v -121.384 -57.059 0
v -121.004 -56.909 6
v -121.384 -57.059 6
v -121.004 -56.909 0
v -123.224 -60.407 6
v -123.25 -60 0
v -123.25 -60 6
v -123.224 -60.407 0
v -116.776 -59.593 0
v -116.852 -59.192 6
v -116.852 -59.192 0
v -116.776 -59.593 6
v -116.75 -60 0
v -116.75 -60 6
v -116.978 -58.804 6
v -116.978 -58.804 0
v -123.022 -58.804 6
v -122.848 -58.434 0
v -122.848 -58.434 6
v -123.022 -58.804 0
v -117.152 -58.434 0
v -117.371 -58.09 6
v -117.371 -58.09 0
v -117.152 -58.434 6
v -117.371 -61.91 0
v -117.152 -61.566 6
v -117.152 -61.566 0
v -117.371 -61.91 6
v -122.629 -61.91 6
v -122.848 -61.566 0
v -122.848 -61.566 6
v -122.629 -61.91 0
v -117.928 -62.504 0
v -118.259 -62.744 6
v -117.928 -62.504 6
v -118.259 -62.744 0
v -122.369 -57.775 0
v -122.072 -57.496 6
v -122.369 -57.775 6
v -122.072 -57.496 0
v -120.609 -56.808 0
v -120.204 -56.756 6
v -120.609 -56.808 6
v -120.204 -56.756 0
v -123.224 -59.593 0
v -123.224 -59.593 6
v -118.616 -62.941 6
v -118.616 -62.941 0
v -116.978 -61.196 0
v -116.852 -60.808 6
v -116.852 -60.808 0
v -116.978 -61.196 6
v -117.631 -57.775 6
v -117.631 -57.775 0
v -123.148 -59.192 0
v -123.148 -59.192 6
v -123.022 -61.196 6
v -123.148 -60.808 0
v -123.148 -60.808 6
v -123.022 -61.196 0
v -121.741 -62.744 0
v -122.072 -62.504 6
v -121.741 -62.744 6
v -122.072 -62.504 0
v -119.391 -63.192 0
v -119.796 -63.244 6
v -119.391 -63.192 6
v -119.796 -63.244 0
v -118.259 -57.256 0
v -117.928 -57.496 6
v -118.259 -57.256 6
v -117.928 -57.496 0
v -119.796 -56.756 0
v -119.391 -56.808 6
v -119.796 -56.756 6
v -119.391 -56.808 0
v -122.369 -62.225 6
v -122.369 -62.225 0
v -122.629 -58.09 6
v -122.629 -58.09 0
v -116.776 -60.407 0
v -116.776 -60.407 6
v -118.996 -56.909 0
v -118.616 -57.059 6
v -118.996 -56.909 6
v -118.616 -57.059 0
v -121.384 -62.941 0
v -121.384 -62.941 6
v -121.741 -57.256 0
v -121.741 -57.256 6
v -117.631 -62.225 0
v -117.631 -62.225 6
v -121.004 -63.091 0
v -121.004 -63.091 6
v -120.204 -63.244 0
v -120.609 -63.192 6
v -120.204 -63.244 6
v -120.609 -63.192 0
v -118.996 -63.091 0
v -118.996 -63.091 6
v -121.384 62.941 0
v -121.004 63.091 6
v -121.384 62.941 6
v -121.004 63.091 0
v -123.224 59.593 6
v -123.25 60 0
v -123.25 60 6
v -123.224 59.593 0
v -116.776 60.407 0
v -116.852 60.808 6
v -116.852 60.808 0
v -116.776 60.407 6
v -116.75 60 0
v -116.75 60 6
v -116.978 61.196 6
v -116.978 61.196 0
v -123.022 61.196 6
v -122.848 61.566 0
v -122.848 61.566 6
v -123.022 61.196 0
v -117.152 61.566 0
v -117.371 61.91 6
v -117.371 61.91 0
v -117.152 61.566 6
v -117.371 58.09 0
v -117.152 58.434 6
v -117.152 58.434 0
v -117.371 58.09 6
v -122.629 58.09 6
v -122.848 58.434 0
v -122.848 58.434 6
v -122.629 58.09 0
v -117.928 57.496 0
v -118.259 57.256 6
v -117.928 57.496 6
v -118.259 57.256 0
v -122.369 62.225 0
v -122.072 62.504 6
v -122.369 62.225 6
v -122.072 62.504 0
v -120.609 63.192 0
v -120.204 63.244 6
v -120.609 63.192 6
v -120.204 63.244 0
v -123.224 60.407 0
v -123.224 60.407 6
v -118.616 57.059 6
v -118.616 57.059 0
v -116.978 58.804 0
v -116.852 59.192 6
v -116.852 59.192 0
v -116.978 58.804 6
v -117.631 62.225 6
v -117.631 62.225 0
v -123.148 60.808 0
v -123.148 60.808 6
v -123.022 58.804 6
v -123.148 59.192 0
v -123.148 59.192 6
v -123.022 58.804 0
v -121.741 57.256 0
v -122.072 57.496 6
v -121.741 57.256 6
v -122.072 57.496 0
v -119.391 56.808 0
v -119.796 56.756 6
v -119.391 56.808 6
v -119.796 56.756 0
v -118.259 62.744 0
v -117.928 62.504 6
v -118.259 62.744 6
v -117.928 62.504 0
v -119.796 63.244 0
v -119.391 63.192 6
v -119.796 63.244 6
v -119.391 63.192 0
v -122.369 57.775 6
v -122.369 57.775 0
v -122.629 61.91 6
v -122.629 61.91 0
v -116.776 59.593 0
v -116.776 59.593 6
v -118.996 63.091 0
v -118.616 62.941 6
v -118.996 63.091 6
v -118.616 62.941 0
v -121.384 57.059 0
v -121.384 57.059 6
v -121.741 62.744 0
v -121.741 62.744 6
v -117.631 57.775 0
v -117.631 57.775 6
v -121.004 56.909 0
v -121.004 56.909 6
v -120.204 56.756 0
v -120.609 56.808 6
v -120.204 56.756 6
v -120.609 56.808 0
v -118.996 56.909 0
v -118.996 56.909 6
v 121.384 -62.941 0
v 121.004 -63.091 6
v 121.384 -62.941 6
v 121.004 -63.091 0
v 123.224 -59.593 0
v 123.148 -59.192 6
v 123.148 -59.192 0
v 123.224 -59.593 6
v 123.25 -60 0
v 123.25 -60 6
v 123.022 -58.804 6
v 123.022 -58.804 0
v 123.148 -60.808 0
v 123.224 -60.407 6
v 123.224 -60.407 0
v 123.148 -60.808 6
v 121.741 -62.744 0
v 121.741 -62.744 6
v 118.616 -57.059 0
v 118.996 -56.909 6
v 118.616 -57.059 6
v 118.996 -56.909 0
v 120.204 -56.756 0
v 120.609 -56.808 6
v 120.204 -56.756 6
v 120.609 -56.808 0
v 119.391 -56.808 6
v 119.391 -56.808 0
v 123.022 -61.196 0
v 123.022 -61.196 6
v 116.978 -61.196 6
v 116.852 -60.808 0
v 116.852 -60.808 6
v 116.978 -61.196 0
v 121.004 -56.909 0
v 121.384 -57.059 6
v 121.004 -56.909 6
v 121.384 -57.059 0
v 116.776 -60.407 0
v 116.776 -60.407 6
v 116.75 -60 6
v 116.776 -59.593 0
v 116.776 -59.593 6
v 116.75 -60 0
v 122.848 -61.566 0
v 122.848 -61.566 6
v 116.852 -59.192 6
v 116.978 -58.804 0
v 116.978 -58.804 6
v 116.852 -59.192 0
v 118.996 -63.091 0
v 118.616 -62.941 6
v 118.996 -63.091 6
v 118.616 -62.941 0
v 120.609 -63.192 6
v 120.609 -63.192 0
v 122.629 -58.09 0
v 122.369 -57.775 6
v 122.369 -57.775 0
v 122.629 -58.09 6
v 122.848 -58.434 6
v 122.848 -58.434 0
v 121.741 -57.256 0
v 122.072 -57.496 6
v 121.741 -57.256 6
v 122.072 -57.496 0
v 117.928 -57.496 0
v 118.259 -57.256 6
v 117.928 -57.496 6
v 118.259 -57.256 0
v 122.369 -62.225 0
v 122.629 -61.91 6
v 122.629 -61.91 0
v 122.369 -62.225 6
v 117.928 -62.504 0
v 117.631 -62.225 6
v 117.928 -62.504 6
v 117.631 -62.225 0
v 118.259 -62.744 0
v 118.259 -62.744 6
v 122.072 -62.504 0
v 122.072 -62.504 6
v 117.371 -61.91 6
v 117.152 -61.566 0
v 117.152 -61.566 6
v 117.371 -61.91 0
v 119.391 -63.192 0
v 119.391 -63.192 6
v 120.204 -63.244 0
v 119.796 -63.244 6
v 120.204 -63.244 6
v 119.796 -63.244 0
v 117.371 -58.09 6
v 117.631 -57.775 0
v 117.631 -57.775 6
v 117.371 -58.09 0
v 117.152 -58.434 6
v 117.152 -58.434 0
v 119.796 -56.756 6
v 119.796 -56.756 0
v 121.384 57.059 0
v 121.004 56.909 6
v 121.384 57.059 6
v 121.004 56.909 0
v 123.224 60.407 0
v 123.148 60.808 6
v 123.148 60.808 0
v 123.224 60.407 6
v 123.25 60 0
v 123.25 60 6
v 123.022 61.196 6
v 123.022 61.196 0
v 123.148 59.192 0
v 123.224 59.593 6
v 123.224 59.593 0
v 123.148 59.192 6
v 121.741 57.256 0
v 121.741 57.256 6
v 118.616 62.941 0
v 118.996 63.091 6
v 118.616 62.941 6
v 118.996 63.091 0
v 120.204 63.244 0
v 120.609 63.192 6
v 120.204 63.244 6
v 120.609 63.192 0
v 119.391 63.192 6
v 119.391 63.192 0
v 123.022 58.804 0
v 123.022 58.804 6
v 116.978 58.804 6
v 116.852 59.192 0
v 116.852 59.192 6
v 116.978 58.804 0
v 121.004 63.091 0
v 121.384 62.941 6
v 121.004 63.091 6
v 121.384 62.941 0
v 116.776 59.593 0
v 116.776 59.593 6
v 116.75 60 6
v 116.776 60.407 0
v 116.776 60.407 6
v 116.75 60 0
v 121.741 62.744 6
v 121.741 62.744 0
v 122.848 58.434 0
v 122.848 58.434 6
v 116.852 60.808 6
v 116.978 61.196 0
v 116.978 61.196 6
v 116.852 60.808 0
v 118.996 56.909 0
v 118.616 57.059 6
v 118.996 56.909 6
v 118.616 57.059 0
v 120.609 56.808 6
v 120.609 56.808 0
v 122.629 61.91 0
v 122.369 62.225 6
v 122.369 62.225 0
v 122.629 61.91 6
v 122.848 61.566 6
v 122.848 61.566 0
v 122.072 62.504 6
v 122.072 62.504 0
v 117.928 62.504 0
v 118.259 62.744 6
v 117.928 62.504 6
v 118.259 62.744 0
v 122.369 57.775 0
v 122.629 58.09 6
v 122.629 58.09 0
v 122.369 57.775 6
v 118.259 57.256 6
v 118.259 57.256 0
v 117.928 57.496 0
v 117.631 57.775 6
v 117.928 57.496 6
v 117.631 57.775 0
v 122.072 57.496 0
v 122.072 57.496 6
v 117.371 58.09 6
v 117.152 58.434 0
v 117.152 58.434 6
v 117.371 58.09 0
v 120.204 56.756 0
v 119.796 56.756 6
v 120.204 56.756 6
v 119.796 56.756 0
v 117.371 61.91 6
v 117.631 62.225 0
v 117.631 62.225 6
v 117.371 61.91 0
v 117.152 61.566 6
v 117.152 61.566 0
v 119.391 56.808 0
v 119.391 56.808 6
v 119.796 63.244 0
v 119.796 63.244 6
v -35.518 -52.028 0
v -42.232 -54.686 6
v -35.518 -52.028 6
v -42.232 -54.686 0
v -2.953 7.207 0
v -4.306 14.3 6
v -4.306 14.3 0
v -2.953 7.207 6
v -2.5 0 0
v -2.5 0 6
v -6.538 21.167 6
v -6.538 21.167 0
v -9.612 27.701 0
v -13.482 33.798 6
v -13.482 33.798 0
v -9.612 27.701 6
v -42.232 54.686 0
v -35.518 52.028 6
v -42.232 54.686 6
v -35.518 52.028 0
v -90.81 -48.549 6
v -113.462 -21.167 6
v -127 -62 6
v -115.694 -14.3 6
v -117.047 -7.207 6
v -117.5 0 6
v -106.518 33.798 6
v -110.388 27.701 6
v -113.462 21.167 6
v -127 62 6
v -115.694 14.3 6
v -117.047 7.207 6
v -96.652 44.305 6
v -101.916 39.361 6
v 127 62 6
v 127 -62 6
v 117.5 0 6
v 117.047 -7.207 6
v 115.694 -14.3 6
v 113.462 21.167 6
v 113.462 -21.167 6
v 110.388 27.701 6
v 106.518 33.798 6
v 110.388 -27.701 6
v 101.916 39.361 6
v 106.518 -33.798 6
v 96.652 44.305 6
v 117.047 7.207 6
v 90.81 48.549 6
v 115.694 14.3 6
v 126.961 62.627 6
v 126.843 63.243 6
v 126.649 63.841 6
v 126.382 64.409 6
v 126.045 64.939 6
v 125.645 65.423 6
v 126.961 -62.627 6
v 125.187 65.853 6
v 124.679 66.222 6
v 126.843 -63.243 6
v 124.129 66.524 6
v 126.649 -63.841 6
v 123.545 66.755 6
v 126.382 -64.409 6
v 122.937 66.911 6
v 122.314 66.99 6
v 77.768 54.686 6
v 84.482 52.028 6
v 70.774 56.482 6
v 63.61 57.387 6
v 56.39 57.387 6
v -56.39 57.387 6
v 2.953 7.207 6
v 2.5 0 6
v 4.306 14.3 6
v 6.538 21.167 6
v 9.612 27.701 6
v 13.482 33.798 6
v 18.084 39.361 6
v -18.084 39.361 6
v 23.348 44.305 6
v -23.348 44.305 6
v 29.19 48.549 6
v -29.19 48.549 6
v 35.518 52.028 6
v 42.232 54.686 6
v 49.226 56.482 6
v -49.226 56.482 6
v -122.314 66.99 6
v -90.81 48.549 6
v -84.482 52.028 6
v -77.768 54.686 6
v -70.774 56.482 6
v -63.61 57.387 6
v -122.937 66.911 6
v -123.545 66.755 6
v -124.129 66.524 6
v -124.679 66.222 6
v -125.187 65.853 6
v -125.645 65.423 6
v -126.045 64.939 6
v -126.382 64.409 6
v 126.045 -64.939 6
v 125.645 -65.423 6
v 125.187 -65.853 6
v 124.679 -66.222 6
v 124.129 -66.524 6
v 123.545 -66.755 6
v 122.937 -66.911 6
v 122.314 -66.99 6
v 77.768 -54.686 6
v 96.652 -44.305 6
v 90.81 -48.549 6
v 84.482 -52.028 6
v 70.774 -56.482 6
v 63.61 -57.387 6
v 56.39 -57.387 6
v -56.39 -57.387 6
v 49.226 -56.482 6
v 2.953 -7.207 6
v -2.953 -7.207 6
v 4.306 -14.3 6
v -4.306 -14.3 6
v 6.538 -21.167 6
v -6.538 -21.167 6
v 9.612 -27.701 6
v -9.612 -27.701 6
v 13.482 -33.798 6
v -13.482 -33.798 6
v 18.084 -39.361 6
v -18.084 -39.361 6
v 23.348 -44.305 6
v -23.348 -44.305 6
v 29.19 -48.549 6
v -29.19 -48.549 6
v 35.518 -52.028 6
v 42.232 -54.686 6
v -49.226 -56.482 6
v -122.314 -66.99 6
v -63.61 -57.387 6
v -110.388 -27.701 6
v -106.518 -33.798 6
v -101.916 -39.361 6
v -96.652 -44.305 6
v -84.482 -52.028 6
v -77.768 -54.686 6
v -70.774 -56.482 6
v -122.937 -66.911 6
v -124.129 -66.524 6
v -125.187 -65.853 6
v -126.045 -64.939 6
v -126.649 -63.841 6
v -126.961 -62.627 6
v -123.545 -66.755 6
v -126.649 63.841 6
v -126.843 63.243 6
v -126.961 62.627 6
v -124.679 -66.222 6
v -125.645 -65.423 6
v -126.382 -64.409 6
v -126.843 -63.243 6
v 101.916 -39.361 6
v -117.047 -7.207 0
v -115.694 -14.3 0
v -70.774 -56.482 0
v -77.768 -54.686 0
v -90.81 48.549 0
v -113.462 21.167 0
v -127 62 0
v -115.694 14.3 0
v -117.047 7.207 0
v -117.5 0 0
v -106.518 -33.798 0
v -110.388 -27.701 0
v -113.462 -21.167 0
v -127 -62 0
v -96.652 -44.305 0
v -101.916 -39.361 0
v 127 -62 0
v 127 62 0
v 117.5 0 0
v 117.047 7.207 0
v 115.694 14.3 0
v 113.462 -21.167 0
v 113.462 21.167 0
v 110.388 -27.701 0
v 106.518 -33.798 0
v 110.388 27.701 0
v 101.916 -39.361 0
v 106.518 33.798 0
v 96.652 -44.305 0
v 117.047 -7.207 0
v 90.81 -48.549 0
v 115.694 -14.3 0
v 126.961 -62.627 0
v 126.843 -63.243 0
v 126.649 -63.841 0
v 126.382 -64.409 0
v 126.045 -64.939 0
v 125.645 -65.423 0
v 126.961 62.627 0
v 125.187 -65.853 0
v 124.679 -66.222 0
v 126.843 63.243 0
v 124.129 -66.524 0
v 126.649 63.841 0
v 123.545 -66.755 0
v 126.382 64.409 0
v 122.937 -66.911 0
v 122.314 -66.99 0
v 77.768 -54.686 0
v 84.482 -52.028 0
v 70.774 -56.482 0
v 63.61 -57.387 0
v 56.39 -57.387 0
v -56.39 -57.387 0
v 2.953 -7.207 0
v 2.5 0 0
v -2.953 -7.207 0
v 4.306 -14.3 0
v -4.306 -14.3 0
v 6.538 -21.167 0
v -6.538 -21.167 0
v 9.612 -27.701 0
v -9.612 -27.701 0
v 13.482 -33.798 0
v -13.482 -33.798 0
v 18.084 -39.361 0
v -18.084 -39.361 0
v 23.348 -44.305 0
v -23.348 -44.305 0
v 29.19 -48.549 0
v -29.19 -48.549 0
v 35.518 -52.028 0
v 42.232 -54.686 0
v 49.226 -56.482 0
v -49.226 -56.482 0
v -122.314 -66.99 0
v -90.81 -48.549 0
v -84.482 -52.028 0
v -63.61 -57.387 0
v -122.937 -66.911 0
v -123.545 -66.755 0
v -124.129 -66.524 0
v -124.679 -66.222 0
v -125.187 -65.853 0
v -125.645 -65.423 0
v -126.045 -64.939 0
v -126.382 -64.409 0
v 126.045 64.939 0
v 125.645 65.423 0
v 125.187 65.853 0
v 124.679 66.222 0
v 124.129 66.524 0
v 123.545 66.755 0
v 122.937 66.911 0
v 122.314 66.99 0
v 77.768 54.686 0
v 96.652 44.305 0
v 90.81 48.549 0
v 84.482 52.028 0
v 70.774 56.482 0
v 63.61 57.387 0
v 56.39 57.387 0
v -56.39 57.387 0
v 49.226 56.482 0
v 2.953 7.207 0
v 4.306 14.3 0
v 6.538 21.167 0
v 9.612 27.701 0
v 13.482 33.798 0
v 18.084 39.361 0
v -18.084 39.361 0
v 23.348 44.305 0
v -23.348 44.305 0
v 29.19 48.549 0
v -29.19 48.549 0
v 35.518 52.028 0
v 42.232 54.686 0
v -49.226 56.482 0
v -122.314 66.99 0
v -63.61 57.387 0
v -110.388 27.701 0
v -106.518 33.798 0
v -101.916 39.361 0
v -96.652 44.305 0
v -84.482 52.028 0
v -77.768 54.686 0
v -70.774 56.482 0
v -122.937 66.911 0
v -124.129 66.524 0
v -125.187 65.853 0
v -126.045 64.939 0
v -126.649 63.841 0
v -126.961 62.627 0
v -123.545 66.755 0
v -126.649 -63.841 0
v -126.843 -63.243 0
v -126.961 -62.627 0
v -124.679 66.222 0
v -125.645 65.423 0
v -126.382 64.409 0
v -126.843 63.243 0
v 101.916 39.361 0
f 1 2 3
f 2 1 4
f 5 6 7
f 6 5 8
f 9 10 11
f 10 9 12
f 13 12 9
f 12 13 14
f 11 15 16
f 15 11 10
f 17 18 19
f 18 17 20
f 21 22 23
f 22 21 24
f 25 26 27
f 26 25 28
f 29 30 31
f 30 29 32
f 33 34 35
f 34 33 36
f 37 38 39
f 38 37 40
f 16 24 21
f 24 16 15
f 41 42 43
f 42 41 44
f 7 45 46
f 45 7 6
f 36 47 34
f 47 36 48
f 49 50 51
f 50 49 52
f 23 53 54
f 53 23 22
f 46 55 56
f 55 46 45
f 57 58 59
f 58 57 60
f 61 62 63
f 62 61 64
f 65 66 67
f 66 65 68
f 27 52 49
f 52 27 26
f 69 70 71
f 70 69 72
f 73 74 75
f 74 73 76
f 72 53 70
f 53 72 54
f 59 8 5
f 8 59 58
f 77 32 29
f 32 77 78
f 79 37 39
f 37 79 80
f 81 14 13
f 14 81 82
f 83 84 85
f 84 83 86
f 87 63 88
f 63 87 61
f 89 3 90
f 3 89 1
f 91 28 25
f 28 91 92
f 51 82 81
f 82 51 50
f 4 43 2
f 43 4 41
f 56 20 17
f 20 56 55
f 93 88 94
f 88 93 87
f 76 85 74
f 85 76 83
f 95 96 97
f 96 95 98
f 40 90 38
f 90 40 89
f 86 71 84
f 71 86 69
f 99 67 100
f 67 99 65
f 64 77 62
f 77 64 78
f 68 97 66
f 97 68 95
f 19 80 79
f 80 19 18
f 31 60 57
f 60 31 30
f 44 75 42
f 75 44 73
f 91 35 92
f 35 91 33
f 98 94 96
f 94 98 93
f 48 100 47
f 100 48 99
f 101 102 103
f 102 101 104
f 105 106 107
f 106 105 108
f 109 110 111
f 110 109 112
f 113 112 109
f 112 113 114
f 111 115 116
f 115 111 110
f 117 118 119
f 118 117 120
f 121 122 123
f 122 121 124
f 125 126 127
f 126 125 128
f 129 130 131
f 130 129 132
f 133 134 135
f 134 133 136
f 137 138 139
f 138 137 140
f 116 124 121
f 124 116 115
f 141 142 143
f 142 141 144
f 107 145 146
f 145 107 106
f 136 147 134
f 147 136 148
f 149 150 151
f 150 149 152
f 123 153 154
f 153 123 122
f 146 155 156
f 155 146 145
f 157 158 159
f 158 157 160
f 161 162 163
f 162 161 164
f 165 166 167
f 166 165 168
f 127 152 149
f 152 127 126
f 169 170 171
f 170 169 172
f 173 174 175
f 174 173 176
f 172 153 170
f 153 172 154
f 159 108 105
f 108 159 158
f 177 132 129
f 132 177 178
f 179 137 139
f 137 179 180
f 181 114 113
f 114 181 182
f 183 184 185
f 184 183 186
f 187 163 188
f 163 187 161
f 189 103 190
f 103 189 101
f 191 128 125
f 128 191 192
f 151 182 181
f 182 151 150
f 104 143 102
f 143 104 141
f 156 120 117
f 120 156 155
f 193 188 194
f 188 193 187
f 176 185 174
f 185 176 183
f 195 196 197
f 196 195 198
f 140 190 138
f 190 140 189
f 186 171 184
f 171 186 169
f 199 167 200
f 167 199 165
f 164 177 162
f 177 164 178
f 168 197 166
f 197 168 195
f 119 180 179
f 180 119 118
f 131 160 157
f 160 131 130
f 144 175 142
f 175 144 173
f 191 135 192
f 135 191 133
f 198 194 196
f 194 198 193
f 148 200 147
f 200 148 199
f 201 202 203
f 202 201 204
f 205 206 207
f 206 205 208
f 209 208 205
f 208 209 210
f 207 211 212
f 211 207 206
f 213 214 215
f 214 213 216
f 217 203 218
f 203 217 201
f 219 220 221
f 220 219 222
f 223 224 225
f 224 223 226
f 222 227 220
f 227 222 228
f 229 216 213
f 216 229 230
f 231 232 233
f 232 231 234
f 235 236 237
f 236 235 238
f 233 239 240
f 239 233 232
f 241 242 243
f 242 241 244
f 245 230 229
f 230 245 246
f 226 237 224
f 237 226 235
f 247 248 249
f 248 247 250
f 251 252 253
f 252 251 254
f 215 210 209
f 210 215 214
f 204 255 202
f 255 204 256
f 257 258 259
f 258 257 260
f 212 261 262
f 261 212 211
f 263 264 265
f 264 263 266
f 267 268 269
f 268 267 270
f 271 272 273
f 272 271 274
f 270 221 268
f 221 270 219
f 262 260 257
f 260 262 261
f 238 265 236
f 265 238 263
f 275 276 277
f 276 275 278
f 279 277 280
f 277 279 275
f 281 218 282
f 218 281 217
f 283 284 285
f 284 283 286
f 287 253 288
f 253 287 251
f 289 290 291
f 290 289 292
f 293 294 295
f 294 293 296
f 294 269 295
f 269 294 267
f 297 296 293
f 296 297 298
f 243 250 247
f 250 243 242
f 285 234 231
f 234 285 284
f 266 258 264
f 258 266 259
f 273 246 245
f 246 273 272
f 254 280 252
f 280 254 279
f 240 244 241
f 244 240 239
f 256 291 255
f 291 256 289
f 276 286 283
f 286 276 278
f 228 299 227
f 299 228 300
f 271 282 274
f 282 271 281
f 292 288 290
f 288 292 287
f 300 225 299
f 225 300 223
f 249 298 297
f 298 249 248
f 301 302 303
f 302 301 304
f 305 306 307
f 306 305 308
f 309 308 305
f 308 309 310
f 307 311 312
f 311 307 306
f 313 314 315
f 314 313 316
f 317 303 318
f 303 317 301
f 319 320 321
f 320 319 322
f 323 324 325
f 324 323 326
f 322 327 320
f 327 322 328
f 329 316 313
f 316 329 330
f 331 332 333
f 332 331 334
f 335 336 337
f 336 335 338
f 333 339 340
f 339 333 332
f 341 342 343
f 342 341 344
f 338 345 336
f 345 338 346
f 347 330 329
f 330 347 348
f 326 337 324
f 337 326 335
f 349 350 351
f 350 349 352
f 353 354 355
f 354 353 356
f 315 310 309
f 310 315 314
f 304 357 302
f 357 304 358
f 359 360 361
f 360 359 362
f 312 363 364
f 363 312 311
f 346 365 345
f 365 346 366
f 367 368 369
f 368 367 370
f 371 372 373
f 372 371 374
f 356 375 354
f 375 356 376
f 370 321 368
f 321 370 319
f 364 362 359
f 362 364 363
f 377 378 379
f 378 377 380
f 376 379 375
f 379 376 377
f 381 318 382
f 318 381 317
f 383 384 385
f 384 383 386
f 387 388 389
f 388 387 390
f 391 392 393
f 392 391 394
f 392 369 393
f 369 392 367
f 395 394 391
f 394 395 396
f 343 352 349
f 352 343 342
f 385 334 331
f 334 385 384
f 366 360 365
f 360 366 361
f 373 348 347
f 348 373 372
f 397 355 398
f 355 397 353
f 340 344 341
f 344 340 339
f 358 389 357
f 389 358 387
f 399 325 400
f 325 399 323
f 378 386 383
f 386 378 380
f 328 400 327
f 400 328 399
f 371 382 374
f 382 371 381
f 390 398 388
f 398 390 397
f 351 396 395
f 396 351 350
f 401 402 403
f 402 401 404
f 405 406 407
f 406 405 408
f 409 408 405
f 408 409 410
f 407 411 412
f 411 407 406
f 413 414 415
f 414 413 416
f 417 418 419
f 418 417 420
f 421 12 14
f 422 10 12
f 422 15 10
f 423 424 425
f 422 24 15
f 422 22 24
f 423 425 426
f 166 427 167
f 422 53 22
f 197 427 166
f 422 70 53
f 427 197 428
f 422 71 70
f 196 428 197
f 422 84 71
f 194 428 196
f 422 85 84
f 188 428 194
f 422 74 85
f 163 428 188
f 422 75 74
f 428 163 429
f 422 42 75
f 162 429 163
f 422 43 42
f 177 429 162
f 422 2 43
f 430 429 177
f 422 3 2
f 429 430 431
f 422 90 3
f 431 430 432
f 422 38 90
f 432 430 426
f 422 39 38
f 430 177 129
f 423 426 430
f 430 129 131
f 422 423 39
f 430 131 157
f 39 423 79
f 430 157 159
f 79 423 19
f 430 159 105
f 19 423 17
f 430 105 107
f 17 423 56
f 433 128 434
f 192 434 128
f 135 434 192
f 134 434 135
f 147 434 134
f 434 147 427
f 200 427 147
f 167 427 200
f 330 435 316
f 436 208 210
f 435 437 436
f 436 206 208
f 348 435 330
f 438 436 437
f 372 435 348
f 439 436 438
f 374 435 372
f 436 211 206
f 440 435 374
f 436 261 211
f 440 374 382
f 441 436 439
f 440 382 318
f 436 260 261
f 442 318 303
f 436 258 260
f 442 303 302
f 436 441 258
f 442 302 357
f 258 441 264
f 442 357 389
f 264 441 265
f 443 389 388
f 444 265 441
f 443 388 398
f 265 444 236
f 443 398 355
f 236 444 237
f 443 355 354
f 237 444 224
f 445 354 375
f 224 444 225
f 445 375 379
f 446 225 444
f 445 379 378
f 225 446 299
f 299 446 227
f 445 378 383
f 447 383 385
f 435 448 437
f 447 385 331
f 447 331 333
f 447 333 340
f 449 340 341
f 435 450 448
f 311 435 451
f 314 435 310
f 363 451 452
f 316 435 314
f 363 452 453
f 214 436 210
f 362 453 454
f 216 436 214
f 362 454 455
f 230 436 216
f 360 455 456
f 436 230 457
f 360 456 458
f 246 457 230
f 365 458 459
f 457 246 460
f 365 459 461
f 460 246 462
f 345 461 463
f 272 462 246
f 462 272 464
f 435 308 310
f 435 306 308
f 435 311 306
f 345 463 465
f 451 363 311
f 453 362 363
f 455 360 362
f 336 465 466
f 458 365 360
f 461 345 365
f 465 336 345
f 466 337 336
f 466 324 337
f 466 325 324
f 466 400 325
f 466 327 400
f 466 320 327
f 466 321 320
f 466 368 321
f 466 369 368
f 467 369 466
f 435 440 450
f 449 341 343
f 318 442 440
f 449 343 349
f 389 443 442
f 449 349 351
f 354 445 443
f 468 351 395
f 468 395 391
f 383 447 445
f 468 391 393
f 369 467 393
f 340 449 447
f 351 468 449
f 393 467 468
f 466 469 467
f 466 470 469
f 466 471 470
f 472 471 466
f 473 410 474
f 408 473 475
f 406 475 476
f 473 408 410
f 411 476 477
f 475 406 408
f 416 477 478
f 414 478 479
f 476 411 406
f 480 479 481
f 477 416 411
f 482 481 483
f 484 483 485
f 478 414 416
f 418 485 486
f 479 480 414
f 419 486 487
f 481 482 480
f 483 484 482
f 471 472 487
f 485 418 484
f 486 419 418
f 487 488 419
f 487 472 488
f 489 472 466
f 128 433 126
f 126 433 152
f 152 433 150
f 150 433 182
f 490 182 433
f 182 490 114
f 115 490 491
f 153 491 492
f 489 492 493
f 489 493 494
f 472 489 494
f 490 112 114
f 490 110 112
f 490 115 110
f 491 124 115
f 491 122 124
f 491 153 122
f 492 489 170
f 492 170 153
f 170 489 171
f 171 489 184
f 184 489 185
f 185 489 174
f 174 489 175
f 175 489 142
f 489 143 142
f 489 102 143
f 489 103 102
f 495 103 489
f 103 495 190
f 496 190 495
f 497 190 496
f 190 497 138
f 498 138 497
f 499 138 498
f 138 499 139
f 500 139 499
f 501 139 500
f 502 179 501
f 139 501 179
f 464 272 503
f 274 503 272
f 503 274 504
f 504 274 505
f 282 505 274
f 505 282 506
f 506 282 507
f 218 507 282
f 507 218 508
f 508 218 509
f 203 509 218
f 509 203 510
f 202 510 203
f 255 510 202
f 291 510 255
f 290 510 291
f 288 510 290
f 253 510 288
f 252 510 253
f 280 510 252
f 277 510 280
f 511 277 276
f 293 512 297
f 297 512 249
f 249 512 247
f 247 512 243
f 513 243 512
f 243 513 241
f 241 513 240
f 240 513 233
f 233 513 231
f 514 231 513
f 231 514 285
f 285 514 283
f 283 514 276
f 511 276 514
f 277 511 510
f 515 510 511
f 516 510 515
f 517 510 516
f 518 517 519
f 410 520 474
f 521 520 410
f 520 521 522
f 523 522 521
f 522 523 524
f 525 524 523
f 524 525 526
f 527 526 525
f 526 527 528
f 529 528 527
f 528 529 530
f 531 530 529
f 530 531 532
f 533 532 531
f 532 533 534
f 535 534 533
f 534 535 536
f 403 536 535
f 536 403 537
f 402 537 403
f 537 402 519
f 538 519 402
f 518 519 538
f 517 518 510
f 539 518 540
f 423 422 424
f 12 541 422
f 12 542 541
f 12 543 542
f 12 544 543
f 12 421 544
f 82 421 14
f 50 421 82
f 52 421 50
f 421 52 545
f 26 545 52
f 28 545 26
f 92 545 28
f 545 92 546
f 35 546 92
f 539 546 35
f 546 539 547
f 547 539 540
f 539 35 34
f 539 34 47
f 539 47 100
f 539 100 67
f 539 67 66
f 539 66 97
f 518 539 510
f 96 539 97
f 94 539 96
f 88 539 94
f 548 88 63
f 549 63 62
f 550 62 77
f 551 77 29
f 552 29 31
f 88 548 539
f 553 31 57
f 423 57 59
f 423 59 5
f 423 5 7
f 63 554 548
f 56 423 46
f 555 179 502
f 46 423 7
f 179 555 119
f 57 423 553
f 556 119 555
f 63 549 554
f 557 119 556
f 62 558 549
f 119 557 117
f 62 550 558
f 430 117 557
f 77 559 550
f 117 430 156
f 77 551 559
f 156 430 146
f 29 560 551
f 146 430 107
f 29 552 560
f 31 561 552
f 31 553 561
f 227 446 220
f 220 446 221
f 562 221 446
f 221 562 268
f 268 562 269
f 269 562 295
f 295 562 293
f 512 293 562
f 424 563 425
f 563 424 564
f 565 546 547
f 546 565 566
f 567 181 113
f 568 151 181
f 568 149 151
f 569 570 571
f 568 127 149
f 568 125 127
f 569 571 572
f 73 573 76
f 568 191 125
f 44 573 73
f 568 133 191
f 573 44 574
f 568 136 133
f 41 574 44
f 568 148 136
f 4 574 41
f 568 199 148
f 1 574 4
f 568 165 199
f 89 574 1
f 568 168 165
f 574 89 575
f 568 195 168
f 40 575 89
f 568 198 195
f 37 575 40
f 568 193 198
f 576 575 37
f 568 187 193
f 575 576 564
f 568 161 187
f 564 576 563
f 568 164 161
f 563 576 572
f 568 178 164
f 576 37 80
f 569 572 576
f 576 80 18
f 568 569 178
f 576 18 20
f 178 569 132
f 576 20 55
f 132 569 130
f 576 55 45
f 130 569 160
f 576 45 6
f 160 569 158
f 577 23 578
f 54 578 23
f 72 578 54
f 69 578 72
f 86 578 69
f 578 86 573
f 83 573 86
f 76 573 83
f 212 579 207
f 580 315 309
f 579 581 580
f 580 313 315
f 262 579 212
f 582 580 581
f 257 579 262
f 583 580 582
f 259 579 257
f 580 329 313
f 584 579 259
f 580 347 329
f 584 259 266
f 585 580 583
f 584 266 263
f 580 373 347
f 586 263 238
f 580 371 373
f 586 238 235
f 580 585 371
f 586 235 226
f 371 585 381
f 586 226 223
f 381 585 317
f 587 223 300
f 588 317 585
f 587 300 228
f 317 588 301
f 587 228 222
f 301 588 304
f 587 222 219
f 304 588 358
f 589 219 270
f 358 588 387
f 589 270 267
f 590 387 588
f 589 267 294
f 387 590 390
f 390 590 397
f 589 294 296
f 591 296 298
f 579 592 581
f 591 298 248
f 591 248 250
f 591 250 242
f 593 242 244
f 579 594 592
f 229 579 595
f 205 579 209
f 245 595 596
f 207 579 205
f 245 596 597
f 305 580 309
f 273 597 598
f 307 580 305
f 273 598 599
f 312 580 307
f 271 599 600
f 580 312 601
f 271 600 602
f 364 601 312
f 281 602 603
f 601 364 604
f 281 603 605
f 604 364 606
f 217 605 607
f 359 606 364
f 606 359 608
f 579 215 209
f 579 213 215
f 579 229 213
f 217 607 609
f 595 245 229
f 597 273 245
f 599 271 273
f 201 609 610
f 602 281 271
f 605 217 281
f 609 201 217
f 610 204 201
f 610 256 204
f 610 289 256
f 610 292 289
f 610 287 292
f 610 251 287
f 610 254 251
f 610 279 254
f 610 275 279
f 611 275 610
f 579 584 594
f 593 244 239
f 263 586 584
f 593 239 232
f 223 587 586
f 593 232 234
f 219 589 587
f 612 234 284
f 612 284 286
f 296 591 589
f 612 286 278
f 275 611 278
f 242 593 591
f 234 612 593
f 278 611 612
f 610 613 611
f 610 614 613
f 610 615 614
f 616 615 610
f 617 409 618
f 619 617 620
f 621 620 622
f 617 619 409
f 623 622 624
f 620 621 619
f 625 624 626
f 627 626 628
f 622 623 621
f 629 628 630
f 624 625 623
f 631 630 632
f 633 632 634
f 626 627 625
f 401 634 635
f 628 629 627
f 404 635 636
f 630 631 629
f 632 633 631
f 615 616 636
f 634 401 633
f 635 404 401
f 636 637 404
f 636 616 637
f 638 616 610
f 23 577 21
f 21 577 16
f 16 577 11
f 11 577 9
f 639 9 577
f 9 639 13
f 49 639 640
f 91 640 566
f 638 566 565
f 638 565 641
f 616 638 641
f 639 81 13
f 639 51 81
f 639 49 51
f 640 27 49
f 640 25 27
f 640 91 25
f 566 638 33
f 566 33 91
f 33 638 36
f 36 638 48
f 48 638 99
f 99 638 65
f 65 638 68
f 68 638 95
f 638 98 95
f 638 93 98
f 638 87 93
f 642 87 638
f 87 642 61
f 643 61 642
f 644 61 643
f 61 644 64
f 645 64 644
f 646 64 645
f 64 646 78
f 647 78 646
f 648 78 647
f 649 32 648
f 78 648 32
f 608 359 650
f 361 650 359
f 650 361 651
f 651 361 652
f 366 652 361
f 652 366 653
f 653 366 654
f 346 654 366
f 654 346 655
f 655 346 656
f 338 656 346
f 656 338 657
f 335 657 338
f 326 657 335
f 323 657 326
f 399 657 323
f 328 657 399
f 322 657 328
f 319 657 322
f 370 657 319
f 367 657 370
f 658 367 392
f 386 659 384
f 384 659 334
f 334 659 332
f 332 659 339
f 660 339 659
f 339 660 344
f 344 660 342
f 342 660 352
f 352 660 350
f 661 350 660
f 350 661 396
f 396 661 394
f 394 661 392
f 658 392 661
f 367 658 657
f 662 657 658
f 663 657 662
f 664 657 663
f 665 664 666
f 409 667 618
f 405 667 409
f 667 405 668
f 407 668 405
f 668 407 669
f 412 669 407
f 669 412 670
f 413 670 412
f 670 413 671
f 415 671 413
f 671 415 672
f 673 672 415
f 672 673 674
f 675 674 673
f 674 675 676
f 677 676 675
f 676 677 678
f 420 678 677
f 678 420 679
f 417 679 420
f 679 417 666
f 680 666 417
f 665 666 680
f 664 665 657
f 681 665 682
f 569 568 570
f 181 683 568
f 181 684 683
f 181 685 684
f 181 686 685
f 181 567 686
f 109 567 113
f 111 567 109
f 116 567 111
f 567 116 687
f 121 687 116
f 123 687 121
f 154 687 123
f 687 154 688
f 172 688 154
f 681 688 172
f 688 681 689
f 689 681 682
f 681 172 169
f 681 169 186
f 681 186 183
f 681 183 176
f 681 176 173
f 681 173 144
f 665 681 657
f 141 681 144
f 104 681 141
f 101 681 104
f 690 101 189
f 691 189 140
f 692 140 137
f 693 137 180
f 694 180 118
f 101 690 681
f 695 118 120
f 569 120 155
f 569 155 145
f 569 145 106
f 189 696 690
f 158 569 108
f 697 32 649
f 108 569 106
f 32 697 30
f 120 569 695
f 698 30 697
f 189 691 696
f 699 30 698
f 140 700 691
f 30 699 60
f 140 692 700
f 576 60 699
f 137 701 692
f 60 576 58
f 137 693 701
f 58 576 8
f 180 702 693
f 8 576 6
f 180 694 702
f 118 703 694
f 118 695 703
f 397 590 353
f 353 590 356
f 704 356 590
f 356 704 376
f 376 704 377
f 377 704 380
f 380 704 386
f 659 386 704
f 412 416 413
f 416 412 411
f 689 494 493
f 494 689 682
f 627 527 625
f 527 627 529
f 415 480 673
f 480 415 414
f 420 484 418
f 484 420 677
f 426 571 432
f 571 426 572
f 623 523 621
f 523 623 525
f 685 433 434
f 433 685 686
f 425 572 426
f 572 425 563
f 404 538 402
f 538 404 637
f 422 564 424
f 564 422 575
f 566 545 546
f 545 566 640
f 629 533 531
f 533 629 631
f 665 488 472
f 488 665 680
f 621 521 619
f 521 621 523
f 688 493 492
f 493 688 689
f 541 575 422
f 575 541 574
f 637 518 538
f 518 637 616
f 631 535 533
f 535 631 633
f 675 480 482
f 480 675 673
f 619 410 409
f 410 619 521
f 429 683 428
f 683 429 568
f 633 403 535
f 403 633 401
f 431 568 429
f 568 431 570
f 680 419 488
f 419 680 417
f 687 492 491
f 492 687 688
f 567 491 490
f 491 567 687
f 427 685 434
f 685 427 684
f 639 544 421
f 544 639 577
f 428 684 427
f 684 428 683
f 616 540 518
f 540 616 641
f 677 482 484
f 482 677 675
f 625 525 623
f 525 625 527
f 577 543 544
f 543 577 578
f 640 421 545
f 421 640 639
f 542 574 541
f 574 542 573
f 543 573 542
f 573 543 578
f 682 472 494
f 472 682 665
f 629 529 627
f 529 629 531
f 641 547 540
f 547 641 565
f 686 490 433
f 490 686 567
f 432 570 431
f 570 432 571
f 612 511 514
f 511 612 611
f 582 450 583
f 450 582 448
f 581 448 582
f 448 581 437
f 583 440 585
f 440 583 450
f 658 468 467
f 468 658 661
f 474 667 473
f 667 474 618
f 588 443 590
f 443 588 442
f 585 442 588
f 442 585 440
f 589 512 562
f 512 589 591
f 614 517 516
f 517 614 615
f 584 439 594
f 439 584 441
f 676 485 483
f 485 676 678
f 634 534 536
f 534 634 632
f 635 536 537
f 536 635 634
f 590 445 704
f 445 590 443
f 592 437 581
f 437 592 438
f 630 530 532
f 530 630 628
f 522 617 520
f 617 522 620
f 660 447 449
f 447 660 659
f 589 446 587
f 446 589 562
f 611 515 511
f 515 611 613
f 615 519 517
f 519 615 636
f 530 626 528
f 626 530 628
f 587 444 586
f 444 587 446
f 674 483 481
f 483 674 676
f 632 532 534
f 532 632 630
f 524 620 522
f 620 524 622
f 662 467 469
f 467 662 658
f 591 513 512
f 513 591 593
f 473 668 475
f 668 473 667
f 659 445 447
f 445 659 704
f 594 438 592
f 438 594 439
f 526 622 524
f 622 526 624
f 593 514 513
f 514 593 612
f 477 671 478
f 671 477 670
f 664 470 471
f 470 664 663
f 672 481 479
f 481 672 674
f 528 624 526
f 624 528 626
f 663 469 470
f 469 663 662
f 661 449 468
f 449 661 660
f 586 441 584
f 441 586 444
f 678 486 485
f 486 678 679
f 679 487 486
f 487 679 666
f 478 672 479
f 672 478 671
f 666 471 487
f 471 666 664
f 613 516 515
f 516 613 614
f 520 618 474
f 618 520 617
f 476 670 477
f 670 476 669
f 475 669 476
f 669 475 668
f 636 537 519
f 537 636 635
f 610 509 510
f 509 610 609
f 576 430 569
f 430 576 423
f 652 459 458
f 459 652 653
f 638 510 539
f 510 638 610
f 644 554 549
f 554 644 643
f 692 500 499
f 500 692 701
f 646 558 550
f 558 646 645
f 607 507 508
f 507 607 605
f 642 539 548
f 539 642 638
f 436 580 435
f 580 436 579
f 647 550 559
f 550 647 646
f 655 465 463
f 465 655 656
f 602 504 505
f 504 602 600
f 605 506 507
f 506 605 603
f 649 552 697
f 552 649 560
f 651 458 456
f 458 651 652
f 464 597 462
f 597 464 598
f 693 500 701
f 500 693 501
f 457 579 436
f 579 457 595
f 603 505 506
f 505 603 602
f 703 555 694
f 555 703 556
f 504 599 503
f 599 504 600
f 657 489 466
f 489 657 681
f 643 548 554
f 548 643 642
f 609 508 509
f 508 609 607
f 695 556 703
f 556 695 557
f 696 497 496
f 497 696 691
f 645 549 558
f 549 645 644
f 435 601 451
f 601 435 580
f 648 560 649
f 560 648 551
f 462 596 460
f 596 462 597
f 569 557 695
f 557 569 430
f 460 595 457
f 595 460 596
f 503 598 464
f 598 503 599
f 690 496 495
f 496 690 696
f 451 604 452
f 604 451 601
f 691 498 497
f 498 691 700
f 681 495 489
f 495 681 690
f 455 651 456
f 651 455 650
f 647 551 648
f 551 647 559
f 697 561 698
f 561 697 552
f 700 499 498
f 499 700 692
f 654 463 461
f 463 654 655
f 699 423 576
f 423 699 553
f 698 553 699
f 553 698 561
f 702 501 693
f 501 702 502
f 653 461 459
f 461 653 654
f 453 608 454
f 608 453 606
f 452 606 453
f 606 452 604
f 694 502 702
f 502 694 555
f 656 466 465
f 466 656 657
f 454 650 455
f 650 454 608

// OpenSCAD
$fn = 50;


difference() {
	union() {
		hull() {
			translate(v = [-122.0000000000, 62.0000000000, 0]) {
				cylinder(h = 6, r = 5);
			}
			translate(v = [122.0000000000, 62.0000000000, 0]) {
				cylinder(h = 6, r = 5);
			}
			translate(v = [-122.0000000000, -62.0000000000, 0]) {
				cylinder(h = 6, r = 5);
			}
			translate(v = [122.0000000000, -62.0000000000, 0]) {
				cylinder(h = 6, r = 5);
			}
		}
	}
	union() {
		#translate(v = [-120.0000000000, -60.0000000000, -100.0000000000]) {
			cylinder(h = 200, r = 3.2500000000);
		}
		#translate(v = [-120.0000000000, 60.0000000000, -100.0000000000]) {
			cylinder(h = 200, r = 3.2500000000);
		}
		#translate(v = [120.0000000000, -60.0000000000, -100.0000000000]) {
			cylinder(h = 200, r = 3.2500000000);
		}
		#translate(v = [120.0000000000, 60.0000000000, -100.0000000000]) {
			cylinder(h = 200, r = 3.2500000000);
		}
		#translate(v = [-60.0000000000, 0, 0]) {
			cylinder(h = 6, r = 57.5000000000);
		}
		#translate(v = [60.0000000000, 0, 0]) {
			cylinder(h = 6, r = 57.5000000000);
		}
	}
}
